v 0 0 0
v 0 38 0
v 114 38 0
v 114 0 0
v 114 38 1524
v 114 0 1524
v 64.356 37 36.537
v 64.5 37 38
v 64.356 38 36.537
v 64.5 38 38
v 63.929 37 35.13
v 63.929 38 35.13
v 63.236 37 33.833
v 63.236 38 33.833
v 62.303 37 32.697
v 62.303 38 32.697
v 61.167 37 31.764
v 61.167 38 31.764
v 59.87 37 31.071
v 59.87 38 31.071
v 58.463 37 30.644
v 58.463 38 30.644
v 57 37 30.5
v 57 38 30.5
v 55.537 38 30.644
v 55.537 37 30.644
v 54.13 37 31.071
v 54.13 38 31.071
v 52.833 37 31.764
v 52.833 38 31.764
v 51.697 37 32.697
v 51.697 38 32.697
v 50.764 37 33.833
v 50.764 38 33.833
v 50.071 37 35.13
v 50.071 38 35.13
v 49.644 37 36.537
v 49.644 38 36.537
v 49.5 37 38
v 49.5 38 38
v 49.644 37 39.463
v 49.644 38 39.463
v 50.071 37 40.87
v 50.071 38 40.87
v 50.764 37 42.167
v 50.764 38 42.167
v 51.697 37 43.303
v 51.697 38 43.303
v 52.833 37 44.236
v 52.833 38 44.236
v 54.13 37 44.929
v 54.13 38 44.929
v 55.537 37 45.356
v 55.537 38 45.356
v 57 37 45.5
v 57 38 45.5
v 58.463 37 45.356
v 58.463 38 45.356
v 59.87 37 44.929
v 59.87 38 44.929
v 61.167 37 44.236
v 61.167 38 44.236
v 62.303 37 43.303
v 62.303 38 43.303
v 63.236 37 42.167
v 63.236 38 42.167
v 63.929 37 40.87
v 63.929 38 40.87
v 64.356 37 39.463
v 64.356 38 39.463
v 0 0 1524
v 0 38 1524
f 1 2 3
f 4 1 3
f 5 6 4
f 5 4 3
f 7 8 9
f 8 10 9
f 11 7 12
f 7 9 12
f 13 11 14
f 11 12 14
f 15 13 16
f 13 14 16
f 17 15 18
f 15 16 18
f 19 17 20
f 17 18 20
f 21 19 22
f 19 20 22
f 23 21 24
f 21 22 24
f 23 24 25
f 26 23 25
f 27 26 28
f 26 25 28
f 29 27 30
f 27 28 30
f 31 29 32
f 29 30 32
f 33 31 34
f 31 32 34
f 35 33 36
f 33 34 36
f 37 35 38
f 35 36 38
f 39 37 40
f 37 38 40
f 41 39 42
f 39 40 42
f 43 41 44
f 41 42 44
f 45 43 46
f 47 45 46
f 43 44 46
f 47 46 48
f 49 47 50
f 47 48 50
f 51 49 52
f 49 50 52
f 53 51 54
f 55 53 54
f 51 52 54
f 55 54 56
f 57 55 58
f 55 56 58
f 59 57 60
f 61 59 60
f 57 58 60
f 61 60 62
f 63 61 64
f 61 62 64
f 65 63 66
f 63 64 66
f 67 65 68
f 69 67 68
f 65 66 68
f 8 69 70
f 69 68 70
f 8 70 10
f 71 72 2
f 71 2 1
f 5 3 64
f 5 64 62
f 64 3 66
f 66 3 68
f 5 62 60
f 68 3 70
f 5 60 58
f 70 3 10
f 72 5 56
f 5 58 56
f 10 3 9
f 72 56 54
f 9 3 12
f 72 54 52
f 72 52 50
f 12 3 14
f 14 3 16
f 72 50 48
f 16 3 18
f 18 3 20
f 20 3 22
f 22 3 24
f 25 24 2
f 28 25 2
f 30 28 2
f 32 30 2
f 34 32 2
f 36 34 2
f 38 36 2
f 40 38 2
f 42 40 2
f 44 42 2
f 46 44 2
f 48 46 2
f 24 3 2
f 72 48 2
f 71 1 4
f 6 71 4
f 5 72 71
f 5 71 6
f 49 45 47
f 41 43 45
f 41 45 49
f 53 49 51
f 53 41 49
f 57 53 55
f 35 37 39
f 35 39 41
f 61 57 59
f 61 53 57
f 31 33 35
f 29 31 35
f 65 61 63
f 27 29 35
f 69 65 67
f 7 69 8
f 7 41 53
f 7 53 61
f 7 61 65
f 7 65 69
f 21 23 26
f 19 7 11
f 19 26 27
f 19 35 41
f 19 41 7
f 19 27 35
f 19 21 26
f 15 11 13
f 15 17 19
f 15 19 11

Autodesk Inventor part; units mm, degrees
ref_plane "YZ Plane" through (0, 0, 0) normal (1, 0, 0) x (0, 1, 0)
ref_plane "XZ Plane" through (0, 0, 0) normal (0, 1, 0) x (-1, 0, 0)
ref_plane "XY Plane" through (0, 0, 0) normal (0, 0, 1) x (1, 0, 0)
sketch "Sketch1" plane through (0, 0, 0) normal (0, 0, 1) x (1, 0, 0)
  line L0 (0, 0) -> (114, 0)
  line L1 (114, 0) -> (114, 38)
  line L2 (114, 38) -> (0, 38)
  line L3 (0, 38) -> (0, 0)
  dimension "d0" = 114
  dimension "d1" = 38
extrude "Extrusion1" add sketch "Sketch1" along normal blind 1524
sketch "Sketch3" plane through (0, 38, 0) normal (0, 1, 0) x (1, 0, 0)
  circle A0 centre (57, -38) radius 7.5
  line L0 (114, 0) -> (0, 0) projected
  dimension "d23" = 38
  dimension "d24" = 15
extrude "Extrusion2" cut sketch "Sketch3" against normal blind 1
properties part number "2p2ps37" material "Wood (Cherry)"
